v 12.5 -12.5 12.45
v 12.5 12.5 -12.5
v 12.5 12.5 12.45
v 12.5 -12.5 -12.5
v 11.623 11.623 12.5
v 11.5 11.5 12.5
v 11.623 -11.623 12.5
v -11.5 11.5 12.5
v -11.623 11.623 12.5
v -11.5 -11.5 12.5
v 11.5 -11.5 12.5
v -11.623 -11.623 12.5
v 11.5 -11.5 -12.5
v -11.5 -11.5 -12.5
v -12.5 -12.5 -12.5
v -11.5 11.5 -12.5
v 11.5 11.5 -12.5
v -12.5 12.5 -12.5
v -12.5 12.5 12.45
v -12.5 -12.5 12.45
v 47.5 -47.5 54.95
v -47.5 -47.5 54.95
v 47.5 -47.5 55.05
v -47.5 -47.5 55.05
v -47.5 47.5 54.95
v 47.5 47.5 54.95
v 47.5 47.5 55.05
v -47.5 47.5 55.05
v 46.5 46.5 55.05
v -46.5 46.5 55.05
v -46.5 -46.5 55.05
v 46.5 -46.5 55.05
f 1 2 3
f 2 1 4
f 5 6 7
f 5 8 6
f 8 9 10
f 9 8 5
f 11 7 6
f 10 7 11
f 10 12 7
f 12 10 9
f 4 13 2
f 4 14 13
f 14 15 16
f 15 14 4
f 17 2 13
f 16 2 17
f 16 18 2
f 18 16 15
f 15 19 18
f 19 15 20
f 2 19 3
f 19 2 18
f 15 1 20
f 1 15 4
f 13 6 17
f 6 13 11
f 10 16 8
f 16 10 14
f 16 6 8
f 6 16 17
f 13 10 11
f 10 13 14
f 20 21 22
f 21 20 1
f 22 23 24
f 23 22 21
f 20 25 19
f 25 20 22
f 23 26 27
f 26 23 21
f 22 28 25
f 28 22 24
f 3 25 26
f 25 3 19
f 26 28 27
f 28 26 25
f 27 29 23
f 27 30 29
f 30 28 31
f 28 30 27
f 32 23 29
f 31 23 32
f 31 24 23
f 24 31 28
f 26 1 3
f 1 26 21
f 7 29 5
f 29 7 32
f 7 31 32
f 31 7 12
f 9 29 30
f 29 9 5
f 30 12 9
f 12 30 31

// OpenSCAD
$fn = 180;

*union(){
    difference(){
        cylinder(r=13, h=20, center=true);
        cylinder(r=11, h=22, center=true);
    }
    difference(){
        hull(){
            translate([0, 0, 10]) cylinder(r=13, h=0.1, center=true);
            translate([0, 0, 25]) cylinder(r=20, h=0.1, center=true);
        }
        hull(){
            translate([0, 0, 10]) cylinder(r=11, h=0.1, center=true);
            translate([0, 0, 25.5]) cylinder(r=18, h=0.1, center=true);
        }
    }
}


union(){
    difference(){
        cube([25,25,25],center=true);
        cube([23,23,27],center=true);
    }
    difference(){
        hull(){
            translate([0, 0, 12.5]) cube([25,25,0.1],center=true);
            translate([0, 0, 55]) cube([95,95,0.1],center=true);
        }
        hull(){
            translate([0, 0, 55.1]) cube([93,93,0.1],center=true);
            translate([0, 0, 12.4]) cube([23,23,0.1],center=true);
        }
    }
}
